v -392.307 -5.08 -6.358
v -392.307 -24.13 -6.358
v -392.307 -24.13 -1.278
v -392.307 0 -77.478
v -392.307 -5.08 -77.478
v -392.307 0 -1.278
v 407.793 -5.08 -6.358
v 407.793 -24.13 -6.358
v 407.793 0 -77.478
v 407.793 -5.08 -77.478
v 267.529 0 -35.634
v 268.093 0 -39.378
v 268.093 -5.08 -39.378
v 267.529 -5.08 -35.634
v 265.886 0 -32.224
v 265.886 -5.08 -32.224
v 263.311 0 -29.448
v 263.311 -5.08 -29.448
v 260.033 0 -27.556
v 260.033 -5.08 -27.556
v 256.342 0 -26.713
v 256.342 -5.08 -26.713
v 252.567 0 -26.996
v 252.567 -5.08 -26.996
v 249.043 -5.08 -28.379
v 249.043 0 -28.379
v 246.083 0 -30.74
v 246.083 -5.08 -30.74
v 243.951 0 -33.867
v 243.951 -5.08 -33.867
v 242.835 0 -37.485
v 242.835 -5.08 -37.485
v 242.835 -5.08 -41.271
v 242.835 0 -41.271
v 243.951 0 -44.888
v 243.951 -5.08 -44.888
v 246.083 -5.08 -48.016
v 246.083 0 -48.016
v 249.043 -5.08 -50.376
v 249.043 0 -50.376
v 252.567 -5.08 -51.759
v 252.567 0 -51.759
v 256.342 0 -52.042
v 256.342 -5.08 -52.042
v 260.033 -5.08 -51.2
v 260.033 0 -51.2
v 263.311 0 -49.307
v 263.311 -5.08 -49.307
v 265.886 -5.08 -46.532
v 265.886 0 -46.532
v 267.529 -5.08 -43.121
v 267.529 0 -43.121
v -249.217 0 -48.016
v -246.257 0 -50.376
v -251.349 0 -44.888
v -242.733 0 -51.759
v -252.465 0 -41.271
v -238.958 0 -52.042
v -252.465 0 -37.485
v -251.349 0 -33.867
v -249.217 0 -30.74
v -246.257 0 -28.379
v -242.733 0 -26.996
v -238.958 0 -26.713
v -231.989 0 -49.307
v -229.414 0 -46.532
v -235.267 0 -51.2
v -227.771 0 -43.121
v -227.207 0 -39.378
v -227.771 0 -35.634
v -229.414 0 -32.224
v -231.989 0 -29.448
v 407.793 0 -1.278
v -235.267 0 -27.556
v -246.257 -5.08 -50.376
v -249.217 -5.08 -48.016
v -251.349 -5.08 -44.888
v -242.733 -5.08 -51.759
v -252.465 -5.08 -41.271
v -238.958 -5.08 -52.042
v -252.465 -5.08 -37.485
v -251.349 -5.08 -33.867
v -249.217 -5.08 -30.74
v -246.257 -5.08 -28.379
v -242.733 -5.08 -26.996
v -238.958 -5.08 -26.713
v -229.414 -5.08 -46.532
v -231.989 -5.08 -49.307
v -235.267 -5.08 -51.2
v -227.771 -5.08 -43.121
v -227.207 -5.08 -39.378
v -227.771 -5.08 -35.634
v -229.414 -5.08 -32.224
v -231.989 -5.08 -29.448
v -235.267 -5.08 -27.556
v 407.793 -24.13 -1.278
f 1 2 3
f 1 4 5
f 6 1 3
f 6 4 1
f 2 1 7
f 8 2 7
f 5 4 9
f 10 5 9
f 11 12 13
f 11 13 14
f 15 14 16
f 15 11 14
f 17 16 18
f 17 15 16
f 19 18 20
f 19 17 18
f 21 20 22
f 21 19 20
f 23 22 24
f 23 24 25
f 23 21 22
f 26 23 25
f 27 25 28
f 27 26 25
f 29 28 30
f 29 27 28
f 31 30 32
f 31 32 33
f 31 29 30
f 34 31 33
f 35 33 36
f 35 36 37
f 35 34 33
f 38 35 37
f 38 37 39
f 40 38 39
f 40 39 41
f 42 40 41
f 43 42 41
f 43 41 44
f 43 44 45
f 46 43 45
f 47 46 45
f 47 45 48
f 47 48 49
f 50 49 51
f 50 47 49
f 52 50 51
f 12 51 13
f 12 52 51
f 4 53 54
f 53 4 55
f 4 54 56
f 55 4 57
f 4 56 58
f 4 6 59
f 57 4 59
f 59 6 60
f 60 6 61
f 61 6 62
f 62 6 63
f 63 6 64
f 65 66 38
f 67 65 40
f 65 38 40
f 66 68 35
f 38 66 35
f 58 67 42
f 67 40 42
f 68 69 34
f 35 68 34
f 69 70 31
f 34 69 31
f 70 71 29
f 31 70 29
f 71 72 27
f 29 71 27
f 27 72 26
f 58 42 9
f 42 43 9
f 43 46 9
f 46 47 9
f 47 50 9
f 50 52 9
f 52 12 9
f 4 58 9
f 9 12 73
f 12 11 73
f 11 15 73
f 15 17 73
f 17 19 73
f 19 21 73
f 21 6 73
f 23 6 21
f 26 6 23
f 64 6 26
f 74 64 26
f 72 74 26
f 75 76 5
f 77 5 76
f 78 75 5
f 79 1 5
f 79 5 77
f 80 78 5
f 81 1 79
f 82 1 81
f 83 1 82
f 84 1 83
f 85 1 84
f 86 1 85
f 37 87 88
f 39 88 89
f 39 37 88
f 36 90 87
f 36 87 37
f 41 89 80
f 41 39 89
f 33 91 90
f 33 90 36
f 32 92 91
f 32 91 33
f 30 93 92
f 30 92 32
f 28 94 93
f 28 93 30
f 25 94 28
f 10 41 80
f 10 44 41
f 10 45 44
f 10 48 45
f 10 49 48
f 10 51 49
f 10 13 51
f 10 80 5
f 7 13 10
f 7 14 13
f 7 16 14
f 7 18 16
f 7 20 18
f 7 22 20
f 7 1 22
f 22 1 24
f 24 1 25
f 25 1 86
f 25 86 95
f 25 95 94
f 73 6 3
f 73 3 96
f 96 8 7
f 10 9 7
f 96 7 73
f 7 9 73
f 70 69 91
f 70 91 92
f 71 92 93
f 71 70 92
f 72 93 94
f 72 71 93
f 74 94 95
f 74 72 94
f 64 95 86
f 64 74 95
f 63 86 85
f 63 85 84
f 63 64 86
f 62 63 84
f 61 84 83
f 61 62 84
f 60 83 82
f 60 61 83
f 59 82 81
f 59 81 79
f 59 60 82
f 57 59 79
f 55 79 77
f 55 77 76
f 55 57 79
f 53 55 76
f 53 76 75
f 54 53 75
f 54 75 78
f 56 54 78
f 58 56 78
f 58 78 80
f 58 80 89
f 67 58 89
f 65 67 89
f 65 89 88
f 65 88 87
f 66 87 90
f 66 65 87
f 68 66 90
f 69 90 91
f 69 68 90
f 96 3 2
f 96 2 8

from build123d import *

# Parameters (mm, degrees)
F0_W     = 800.1
F0_H     = 76.2
F0_R     = 12.7
F1_DEPTH = 5.08
F2_W     = 800.1
F2_H     = 5.08
F3_DEPTH = 19.05


with BuildPart() as f1:
    # F0 (on Front) → F1 (new body)
    with BuildSketch(Plane.XZ):
        with Locations((7.7429, -39.377729)):
            Rectangle(F0_W, F0_H)
        with Locations((255.3929, -39.377729)):
            Circle(F0_R, mode=Mode.SUBTRACT)
        with Locations((-239.9071, -39.377729)):
            Circle(F0_R, mode=Mode.SUBTRACT)
    extrude(amount=F1_DEPTH)

    # F2 (on face) → F3 (join)
    with BuildSketch(Plane.XZ.offset(5.08)):
        with Locations((7.7429, -3.817729)):
            Rectangle(F2_W, F2_H)
    extrude(amount=F3_DEPTH)


solid = f1.part
